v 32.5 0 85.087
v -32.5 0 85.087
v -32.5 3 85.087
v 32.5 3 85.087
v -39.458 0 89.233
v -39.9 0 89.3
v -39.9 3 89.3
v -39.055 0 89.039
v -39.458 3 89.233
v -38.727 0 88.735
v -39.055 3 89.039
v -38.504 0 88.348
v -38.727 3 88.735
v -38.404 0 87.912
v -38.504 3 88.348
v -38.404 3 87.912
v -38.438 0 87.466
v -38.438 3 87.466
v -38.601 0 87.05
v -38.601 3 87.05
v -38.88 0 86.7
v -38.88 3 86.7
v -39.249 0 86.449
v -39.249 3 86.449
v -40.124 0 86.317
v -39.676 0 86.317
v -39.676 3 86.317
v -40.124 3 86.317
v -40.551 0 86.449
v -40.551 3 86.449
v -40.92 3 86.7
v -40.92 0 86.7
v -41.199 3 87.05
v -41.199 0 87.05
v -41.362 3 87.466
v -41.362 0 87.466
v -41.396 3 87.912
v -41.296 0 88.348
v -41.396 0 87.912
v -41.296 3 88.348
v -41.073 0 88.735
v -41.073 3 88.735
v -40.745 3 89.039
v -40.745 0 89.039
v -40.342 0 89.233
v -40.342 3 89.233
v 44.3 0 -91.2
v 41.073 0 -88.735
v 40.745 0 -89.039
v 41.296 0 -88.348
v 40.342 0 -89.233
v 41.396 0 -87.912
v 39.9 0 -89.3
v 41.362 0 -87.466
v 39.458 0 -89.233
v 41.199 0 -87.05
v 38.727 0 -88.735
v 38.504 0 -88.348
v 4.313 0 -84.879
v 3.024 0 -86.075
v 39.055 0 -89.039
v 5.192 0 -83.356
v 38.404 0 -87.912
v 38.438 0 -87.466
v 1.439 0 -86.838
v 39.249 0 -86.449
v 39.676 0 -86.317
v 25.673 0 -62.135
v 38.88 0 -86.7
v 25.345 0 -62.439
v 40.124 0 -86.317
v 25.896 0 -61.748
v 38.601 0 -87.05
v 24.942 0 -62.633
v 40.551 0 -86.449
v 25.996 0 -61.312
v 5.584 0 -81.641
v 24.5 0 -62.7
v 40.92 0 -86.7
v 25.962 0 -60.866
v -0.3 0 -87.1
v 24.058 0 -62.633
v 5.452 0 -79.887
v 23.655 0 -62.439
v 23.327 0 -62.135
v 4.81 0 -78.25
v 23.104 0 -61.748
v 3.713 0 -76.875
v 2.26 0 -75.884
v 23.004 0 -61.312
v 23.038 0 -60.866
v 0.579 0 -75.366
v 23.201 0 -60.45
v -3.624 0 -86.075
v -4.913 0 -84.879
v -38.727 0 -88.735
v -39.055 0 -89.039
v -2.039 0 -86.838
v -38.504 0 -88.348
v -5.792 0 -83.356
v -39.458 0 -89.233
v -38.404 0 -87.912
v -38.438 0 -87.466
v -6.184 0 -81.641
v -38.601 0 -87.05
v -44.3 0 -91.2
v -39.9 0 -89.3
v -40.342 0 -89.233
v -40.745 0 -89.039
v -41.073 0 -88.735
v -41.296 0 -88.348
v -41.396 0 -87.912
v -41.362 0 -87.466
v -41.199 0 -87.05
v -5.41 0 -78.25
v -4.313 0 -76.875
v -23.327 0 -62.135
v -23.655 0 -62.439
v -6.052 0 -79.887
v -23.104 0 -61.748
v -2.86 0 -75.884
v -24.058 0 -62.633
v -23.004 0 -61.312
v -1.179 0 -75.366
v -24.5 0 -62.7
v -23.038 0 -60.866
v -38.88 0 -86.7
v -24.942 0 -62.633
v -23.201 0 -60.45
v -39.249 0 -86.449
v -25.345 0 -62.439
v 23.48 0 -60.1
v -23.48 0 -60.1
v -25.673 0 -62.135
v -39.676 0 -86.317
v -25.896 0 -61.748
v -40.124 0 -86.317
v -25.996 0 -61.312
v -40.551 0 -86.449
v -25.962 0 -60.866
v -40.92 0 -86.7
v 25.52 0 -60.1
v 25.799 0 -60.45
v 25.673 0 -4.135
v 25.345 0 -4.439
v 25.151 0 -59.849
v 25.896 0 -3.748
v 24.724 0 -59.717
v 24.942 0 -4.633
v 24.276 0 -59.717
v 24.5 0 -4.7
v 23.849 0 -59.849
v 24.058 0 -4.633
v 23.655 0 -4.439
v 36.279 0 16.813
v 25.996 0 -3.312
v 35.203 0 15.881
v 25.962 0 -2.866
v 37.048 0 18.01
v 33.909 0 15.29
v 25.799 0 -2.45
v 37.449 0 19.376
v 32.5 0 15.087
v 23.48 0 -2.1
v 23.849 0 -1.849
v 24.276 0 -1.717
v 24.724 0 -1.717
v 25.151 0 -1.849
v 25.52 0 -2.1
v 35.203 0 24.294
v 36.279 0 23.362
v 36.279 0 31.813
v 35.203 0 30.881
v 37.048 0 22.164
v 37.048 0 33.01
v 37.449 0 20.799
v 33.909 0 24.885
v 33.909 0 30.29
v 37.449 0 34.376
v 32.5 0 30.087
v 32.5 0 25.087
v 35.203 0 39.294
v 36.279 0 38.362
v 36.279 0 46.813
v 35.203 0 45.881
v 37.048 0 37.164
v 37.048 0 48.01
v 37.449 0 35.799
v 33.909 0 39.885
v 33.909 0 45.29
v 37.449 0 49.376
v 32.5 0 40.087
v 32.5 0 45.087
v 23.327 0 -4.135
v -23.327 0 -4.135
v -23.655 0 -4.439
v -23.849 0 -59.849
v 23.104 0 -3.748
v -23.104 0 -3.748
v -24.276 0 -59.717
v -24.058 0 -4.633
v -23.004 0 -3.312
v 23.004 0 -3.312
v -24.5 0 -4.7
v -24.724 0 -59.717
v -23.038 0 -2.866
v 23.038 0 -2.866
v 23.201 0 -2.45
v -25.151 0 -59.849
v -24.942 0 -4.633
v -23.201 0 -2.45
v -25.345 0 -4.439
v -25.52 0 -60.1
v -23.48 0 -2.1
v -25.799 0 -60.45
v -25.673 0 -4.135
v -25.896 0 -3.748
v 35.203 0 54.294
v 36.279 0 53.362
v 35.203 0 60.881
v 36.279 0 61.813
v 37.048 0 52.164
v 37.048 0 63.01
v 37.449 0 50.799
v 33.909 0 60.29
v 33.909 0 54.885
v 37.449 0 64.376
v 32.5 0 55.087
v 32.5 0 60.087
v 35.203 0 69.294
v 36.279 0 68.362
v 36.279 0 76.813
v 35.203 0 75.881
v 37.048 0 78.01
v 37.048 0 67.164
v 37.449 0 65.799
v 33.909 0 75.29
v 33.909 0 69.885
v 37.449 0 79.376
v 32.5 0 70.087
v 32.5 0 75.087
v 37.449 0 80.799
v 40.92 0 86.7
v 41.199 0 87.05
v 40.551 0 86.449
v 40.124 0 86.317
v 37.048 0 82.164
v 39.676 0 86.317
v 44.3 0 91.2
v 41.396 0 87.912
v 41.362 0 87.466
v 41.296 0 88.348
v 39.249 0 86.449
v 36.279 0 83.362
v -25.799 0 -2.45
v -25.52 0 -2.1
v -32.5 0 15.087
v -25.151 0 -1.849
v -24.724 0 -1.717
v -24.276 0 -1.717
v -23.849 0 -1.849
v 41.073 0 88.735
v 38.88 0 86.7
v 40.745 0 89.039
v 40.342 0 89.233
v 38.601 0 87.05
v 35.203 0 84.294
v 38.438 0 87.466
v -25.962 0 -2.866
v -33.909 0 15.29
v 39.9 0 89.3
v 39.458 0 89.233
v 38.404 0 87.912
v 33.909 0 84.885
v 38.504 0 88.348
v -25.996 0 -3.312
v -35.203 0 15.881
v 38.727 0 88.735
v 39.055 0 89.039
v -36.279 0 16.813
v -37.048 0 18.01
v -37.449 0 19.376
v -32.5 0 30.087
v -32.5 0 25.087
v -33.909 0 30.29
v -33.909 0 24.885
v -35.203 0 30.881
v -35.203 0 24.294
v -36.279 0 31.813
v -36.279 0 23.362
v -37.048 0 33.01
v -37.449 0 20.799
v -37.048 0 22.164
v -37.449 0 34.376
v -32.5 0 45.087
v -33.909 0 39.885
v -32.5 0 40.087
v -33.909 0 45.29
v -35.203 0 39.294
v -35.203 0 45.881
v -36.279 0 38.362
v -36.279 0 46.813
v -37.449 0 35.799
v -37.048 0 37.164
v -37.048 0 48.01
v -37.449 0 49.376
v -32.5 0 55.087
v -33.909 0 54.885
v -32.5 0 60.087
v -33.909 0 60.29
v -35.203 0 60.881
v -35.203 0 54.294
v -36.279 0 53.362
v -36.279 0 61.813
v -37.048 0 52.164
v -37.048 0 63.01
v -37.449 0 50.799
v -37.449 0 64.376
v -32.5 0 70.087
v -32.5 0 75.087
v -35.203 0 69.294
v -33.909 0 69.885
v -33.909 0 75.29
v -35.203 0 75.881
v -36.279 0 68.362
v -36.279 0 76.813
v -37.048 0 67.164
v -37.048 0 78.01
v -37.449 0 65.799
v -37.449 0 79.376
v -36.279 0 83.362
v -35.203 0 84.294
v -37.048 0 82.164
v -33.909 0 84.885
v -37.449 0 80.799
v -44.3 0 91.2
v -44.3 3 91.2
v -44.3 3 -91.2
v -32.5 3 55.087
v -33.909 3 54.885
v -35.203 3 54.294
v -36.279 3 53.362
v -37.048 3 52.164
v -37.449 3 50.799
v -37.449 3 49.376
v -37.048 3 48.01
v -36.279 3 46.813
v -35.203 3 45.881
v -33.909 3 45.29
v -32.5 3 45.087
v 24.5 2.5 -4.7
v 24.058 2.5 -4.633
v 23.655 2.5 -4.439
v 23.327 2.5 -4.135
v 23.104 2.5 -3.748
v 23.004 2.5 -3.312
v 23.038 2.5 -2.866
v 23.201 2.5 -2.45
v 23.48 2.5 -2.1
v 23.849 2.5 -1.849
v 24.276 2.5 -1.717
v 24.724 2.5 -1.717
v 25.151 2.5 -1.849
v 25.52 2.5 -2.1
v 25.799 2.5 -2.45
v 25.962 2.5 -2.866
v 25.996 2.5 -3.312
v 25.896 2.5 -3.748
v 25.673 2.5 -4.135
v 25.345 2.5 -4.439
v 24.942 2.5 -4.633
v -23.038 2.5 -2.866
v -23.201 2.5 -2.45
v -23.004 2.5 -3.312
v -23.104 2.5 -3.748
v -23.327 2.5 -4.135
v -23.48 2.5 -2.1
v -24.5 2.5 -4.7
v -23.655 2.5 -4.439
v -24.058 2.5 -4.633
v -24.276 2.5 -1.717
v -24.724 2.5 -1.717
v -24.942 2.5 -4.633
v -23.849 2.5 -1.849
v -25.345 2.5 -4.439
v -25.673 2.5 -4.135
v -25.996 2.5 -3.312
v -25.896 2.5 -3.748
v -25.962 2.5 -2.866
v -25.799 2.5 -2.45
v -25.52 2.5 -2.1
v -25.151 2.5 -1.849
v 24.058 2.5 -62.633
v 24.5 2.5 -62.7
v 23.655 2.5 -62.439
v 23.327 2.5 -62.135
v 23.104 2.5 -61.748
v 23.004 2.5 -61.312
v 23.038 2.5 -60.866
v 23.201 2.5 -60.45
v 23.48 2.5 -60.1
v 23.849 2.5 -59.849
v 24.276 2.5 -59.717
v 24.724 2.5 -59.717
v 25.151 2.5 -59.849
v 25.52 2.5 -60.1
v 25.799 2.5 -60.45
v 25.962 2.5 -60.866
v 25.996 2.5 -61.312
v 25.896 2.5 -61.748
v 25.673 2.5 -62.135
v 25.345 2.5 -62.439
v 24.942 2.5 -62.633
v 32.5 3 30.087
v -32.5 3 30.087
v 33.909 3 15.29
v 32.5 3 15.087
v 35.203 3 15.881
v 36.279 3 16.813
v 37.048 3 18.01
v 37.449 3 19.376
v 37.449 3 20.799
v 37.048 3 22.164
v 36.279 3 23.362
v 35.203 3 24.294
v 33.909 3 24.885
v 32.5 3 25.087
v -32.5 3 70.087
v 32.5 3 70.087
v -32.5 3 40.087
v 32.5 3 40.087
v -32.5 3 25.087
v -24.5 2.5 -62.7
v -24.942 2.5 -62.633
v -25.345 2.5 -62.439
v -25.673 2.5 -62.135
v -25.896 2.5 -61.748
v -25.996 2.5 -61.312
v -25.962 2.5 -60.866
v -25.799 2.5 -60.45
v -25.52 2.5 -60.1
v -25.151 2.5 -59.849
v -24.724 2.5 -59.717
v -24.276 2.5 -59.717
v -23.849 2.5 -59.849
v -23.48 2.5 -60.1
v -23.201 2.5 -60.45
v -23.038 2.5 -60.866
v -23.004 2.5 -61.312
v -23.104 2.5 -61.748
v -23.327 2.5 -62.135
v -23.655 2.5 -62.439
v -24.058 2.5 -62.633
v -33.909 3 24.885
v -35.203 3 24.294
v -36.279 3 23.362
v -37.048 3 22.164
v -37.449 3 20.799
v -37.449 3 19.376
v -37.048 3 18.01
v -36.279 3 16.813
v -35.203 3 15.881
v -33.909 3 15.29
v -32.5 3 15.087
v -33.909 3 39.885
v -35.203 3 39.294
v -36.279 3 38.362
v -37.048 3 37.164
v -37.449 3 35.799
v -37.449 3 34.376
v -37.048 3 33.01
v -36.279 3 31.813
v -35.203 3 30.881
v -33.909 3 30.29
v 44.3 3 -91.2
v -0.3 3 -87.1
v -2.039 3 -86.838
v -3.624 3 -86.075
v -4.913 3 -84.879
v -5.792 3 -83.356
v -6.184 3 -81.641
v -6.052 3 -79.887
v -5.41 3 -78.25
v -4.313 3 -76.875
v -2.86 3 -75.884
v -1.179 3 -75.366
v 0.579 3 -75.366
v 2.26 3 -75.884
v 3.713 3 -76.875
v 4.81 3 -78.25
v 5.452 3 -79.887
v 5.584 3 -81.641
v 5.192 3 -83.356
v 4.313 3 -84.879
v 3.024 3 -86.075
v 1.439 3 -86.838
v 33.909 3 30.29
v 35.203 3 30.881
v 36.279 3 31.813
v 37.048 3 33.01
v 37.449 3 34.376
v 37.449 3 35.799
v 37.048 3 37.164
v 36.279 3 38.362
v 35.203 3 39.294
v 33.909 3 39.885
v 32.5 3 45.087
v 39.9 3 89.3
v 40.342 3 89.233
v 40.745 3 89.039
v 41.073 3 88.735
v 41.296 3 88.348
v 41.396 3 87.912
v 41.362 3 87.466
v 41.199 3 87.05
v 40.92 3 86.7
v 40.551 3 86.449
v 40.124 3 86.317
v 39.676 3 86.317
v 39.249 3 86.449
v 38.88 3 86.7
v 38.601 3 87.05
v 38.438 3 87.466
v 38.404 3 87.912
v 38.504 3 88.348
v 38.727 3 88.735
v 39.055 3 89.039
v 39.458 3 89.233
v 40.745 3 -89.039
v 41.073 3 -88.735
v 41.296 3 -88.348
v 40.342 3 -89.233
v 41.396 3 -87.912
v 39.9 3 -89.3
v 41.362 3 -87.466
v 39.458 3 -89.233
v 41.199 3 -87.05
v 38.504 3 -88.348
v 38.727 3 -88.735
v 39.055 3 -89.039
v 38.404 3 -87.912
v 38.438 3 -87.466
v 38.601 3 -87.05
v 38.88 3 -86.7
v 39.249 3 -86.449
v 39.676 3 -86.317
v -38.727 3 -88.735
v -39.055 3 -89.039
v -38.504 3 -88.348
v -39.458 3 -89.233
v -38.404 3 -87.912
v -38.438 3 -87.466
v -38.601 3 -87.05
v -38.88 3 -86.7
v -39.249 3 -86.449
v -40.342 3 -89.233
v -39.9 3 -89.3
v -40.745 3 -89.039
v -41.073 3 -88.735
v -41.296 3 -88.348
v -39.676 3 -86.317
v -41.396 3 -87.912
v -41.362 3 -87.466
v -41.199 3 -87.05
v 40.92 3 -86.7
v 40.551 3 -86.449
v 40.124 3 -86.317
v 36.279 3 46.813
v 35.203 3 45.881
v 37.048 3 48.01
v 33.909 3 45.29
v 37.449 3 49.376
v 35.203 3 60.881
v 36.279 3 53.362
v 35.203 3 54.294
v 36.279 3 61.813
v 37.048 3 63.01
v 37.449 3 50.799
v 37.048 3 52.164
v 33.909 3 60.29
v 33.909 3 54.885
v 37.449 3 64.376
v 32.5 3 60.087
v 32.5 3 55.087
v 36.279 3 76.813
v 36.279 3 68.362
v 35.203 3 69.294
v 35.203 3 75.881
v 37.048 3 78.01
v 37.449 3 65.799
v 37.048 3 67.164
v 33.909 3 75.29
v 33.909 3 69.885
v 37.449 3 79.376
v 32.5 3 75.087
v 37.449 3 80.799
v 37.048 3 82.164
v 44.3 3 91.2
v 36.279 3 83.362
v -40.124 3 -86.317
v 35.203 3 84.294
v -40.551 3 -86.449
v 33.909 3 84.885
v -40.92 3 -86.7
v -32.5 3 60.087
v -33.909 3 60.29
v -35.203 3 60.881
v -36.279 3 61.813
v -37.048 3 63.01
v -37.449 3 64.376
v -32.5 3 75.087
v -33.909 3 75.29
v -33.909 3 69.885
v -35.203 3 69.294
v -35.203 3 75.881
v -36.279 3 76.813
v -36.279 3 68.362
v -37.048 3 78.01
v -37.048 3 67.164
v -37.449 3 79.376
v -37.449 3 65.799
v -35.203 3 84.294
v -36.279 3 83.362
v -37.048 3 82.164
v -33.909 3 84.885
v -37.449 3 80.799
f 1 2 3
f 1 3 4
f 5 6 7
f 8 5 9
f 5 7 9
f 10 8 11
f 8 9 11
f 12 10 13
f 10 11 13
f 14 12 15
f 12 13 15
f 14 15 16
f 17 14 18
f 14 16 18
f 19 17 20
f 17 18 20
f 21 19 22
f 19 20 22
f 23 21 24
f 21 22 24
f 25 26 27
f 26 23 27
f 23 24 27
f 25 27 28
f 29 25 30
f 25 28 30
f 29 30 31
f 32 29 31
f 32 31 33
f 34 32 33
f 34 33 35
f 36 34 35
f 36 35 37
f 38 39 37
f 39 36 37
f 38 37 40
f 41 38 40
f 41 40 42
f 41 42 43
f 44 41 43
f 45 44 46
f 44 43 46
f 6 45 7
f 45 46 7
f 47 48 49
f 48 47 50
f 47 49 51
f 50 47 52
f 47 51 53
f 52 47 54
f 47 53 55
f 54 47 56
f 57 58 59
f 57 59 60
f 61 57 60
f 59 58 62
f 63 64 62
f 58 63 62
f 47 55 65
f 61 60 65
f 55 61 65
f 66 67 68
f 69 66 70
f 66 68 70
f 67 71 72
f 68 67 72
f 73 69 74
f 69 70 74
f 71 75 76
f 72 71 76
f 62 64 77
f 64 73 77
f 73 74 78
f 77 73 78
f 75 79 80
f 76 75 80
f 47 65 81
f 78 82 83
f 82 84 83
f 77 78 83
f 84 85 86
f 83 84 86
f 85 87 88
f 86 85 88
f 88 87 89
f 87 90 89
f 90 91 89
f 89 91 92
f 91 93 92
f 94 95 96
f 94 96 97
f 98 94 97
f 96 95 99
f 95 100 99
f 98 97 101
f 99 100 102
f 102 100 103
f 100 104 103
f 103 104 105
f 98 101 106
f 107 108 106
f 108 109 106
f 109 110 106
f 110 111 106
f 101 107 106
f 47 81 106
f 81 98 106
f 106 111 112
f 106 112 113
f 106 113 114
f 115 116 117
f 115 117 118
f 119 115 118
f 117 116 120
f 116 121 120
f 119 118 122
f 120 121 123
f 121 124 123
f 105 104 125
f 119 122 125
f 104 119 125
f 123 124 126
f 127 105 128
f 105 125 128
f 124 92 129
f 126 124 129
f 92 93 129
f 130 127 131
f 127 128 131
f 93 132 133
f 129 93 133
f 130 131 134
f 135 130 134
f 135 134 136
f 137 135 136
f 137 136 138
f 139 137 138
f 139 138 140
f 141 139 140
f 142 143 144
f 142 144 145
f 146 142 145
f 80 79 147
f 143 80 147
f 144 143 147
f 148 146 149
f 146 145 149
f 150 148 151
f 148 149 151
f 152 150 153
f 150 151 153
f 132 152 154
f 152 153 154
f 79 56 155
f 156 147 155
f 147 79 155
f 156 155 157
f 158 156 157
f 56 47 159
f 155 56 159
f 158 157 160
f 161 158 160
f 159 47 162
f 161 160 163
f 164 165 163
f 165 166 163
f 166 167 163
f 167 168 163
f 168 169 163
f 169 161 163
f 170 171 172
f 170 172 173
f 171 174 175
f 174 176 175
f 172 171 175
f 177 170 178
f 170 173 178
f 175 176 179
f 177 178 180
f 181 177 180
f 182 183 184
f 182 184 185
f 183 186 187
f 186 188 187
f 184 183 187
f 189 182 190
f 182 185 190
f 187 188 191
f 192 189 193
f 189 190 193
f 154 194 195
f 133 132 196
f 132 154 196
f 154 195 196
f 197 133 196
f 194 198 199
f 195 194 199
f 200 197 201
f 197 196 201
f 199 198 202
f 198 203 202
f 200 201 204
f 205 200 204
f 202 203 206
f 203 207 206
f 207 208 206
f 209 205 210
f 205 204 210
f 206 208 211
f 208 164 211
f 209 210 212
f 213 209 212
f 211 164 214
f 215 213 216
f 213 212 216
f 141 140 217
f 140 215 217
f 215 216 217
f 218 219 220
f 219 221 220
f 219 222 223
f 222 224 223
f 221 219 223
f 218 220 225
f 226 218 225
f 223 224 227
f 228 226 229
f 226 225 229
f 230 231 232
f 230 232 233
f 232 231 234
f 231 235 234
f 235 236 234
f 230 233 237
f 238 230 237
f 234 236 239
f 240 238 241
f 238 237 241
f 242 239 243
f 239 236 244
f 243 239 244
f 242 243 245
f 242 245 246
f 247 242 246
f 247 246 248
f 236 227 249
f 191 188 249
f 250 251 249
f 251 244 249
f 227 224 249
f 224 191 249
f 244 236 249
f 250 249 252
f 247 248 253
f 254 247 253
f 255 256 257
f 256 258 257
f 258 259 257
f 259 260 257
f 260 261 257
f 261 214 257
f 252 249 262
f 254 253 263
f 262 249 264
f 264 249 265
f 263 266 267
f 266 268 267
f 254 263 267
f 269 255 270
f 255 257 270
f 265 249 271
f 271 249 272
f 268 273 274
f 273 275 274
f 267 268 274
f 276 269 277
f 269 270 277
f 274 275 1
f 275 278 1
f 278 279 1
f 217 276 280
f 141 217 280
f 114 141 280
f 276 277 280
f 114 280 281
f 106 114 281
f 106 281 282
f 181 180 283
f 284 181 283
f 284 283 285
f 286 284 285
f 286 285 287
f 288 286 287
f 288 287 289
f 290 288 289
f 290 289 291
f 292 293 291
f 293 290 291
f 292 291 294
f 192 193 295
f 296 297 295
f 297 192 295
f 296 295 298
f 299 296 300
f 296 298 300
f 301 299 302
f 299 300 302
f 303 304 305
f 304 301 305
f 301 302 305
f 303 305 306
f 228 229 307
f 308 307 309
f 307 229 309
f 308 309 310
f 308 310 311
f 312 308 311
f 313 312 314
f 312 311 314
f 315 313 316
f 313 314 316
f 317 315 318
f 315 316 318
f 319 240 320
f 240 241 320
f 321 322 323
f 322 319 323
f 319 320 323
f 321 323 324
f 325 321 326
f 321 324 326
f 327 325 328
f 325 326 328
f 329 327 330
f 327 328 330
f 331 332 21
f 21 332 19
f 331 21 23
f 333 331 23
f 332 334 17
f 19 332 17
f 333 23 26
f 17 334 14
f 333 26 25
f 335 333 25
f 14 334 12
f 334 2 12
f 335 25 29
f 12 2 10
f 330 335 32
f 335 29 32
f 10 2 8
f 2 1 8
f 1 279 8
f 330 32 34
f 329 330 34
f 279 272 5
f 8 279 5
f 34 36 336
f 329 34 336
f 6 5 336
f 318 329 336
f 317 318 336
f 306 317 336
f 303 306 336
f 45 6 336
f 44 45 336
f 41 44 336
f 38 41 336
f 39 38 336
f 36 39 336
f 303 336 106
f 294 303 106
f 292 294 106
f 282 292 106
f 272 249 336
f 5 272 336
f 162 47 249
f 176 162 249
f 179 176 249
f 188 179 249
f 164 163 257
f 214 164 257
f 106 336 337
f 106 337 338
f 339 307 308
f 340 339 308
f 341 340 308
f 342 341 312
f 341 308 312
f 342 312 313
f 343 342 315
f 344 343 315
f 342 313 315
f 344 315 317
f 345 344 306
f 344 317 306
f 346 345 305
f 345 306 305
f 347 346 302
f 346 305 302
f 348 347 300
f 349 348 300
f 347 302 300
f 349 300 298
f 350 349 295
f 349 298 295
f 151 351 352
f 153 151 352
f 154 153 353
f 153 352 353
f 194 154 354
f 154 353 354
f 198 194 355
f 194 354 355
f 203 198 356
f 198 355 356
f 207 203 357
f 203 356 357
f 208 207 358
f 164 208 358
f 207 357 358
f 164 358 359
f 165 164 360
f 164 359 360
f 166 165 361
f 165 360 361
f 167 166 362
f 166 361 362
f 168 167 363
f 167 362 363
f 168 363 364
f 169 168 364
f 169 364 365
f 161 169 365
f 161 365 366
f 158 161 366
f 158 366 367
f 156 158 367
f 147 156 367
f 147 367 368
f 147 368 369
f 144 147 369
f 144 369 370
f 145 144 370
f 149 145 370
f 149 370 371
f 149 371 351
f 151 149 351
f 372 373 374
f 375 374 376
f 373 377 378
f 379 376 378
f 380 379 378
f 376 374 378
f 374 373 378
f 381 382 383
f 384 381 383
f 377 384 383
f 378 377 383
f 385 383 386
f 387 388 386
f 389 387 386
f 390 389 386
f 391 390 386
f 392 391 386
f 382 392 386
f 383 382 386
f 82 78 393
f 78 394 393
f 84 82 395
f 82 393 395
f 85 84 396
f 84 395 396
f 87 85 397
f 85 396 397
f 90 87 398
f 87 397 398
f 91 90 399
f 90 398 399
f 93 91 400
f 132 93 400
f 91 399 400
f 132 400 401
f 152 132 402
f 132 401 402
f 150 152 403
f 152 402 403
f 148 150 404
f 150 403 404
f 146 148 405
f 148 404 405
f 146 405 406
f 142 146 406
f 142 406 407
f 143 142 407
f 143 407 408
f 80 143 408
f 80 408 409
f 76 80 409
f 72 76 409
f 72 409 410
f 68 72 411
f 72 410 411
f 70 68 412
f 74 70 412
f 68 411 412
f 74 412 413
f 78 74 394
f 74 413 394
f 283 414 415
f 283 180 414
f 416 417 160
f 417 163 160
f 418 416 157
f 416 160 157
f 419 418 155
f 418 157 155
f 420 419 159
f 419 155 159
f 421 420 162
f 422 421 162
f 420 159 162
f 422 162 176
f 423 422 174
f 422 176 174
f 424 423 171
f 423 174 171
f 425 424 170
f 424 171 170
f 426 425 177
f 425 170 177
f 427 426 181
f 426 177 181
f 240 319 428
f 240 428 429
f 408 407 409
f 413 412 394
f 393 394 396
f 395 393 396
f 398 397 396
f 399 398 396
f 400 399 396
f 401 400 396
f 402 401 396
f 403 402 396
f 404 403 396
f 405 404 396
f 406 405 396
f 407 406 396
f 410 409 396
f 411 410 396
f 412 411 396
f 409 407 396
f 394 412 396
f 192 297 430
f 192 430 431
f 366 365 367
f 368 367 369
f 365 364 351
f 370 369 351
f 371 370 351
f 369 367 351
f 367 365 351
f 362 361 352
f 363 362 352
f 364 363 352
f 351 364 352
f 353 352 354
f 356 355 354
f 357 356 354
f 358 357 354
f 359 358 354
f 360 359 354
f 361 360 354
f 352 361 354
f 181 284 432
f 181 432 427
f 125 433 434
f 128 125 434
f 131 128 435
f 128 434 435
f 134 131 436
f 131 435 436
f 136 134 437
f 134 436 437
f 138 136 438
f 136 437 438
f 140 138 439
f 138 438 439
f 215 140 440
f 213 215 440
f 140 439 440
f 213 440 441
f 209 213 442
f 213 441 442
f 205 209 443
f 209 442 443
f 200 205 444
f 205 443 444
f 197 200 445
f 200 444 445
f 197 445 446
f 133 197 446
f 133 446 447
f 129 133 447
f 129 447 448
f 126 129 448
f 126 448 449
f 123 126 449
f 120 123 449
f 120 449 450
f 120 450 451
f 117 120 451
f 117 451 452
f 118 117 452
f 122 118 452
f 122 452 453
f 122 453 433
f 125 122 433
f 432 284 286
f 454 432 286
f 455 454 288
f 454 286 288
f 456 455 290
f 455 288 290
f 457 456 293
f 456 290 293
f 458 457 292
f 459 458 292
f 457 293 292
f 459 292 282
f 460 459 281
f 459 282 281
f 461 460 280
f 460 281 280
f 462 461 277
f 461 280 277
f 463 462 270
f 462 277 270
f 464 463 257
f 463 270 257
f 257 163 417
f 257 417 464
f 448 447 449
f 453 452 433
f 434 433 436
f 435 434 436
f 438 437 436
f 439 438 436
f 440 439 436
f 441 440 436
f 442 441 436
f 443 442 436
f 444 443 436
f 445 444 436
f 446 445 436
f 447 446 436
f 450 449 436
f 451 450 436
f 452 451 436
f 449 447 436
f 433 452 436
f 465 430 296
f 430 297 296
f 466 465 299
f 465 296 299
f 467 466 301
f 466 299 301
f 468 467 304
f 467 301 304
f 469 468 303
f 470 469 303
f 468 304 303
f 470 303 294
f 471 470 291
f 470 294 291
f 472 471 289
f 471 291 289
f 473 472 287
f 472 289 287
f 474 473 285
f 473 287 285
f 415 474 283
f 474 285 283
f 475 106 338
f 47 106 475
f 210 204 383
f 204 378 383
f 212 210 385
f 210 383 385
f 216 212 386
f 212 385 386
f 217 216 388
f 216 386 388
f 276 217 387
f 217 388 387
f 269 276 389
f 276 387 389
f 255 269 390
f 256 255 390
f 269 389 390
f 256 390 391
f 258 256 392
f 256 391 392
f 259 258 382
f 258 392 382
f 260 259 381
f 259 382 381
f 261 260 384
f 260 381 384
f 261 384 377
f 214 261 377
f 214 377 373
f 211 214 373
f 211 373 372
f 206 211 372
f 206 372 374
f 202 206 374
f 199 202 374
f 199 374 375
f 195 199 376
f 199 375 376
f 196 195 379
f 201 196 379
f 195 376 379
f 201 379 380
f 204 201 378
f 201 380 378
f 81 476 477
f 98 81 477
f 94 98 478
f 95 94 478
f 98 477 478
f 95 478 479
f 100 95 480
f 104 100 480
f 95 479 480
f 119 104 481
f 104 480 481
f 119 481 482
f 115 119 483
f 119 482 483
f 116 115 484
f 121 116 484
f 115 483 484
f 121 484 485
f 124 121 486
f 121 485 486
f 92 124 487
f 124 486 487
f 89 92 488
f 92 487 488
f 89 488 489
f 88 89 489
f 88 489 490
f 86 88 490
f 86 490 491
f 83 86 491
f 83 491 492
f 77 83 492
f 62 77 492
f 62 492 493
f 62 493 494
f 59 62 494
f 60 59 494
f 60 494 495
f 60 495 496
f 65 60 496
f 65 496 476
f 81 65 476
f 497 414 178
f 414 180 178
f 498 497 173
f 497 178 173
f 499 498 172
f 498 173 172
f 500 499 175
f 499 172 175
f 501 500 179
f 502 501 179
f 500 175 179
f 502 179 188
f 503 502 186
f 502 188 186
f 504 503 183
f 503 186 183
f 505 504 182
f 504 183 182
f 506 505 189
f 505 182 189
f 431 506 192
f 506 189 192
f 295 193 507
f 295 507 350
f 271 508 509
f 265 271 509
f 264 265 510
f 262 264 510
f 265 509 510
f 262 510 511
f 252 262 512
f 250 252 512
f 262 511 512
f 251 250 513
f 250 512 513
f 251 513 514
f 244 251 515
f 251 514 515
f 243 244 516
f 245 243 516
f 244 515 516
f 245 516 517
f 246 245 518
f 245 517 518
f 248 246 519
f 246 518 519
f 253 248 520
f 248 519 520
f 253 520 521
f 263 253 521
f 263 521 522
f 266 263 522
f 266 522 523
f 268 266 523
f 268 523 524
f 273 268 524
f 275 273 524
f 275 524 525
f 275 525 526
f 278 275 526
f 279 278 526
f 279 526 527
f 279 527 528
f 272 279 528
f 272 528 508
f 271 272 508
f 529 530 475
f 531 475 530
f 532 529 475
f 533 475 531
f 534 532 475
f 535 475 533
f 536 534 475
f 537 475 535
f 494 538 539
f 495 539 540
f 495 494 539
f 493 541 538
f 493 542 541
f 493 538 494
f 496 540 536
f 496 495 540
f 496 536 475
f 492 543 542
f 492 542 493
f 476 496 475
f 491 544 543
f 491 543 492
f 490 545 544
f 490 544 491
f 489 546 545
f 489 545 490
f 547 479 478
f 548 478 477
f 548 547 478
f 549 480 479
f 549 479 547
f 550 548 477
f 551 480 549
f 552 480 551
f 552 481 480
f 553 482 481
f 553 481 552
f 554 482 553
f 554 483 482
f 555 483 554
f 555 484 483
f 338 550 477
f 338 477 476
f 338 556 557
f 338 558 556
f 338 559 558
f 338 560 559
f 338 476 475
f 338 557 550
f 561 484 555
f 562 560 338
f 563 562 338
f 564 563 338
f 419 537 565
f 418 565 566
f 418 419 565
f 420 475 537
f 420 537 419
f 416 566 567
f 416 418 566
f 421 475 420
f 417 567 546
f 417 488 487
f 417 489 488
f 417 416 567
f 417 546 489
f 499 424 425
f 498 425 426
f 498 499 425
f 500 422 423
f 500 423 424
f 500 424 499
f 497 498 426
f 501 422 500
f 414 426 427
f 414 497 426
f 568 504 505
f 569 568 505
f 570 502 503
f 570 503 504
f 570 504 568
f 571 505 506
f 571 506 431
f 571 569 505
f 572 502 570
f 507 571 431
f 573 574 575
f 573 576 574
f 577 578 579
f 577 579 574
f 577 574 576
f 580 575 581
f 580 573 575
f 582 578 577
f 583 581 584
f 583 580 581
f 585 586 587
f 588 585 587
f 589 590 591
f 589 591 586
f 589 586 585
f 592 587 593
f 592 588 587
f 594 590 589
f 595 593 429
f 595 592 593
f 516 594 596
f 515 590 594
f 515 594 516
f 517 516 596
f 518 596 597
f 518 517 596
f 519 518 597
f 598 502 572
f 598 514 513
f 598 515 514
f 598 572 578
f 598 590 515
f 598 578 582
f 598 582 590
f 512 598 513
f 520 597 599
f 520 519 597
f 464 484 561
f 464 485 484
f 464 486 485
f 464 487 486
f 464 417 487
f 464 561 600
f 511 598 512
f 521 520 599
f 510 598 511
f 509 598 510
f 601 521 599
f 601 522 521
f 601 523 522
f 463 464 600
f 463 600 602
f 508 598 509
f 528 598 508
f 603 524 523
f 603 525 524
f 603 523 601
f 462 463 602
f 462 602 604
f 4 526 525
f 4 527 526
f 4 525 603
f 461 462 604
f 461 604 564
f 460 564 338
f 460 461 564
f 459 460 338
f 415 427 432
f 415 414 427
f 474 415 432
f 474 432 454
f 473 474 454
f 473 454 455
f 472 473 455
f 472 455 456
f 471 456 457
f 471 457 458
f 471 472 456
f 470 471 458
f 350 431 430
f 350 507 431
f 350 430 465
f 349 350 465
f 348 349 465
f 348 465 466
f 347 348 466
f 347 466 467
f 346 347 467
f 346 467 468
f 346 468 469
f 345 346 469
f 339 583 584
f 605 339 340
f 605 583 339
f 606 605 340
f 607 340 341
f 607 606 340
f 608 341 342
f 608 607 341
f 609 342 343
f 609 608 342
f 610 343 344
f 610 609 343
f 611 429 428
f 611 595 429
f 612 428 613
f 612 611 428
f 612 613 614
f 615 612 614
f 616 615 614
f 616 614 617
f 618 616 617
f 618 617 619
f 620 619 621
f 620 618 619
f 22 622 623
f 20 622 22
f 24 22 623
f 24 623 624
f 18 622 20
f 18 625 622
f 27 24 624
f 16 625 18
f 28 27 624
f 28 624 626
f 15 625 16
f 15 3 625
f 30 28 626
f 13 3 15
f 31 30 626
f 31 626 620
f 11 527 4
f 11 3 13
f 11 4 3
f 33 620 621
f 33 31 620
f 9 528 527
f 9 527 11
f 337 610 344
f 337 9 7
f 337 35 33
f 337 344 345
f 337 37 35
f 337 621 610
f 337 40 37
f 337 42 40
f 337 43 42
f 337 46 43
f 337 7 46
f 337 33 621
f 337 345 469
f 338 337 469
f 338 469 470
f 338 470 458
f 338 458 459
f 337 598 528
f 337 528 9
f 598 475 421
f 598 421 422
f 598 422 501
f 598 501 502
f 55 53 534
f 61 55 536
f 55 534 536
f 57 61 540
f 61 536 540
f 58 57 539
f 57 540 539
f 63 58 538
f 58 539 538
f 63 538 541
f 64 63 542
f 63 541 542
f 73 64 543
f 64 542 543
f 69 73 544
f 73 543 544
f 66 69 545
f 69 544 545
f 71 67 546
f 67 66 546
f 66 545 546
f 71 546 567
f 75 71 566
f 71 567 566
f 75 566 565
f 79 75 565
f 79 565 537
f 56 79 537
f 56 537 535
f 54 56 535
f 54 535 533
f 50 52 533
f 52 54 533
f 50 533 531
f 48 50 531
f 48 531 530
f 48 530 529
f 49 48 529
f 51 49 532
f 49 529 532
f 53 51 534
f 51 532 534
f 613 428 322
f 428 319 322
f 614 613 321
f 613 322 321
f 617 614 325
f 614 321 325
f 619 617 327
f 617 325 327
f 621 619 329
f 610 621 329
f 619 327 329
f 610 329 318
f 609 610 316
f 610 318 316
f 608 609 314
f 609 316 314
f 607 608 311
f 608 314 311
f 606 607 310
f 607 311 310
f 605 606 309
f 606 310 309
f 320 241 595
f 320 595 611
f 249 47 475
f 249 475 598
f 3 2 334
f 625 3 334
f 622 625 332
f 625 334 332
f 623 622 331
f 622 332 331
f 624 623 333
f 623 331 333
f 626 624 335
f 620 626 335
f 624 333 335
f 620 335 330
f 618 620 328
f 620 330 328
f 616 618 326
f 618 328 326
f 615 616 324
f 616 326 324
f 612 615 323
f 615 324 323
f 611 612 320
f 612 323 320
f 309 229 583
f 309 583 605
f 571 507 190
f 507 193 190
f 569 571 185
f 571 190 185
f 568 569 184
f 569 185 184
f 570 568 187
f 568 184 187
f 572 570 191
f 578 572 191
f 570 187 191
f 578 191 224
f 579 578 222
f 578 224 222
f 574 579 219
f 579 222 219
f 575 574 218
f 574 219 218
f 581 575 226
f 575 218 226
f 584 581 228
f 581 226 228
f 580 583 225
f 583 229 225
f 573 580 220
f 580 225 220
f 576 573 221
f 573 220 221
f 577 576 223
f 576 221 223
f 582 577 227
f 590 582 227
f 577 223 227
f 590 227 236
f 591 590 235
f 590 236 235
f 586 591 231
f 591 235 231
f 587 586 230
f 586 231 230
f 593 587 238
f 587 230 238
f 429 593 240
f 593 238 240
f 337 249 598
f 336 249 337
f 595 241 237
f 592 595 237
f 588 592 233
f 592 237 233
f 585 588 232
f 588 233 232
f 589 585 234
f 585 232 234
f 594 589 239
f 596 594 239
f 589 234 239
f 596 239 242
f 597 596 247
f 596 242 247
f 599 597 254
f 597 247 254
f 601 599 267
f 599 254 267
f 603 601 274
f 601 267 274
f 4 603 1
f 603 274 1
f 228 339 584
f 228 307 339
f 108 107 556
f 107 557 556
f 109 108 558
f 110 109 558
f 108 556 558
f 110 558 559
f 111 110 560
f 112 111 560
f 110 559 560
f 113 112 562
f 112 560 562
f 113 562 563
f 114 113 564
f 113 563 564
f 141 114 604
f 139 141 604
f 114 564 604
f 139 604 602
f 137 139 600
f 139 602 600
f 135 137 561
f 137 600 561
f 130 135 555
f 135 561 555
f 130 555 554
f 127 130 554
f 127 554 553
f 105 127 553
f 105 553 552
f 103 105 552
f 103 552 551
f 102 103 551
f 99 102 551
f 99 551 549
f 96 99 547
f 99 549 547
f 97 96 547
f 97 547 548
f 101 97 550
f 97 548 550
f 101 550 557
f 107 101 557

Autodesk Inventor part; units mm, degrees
ref_plane "YZ Plane" through (0, 0, 0) normal (1, 0, 0) x (0, 1, 0)
ref_plane "XZ Plane" through (0, 0, 0) normal (0, 1, 0) x (-1, 0, 0)
ref_plane "XY Plane" through (0, 0, 0) normal (0, 0, 1) x (1, 0, 0)
sketch "Skizze1" plane through (0, 0, 0) normal (0, 1, 0) x (-1, 0, 0)
  line L0 (-44.3, 91.2) -> (44.3, 91.2)
  line L1 (44.3, 91.2) -> (44.3, -91.2)
  line L2 (44.3, -91.2) -> (-44.3, -91.2)
  line L3 (-44.3, -91.2) -> (-44.3, 91.2)
  line L4 (-44.3, 91.2) -> (44.3, -91.2) construction
  line L5 (44.3, 91.2) -> (-44.3, -91.2) construction
  point P0 (0, 0)
  dimension "d0" = 88.6
  dimension "d1" = 182.4
extrude "Extrusion1" add sketch "Skizze1" along normal blind 3
sketch "Skizze2" plane through (0, 0, 0) normal (0, -1, 0) x (1, 0, 0)
  line L0 (-44.3, -91.2) -> (44.3, -91.2) projected
  line L1 (0, -91.2) -> (0, 91.2)
  line L2 (44.3, 91.2) -> (-44.3, 91.2) projected
  line L3 (-24.5, -61.2) -> (24.5, -61.2)
  line L4 (24.5, -61.2) -> (24.5, -3.2)
  line L5 (24.5, -3.2) -> (-24.5, -3.2)
  line L6 (-24.5, -3.2) -> (-24.5, -61.2)
  line L7 (-24.5, -61.2) -> (24.5, -3.2) construction
  line L8 (24.5, -61.2) -> (-24.5, -3.2) construction
  point P0 (0, 0)
  point P1 (0, -32.2)
  dimension "d5" = 49
  dimension "d6" = 58
  dimension "d7" = 30
hole "Bohrung1" at (-24.5, 0, -61.2) at (24.5, 0, -61.2) at (24.5, 0, -3.2) at (-24.5, 0, -3.2) direction (0, 1, 0) diameter 3 depth 2.5
sketch "Skizze3" plane through (0, 0, 0) normal (0, -1, 0) x (1, 0, 0)
  line L0 (32.5, 15.0873) -> (-32.5, 15.0873)
  line L1 (-37.5, 20.0873) -> (-37.5, 20.0873)
  line L2 (-32.5, 25.0873) -> (32.5, 25.0873)
  line L3 (37.5, 20.0873) -> (37.5, 20.0873)
  line L4 (37.5, 15.0873) -> (-37.5, 25.0873) construction
  line L5 (-37.5, 15.0873) -> (37.5, 25.0873) construction
  arc A0 (-37.5, 20.0873) -> (-32.5, 15.0873) centre (-32.5, 20.0873) ccw
  arc A1 (-32.5, 25.0873) -> (-37.5, 20.0873) centre (-32.5, 20.0873) ccw
  arc A2 (32.5, 15.0873) -> (37.5, 20.0873) centre (32.5, 20.0873) ccw
  arc A3 (37.5, 20.0873) -> (32.5, 25.0873) centre (32.5, 20.0873) ccw
  point P0 (0, 0)
  point P1 (0, 20.0873)
  dimension "d15" = 75
  dimension "d16" = 10
  dimension "d18" = 5
  dimension "d19" = 5
  dimension "d20" = 5
extrude "Extrusion2" cut sketch "Skizze3" against normal blind 10
pattern_linear "Rechteckige Anordnung1" count 5 spacing 15 along (0, 0, 1) of "Extrusion2"
hole "Bohrung2" at (-39.9, 0, -87.8) direction (0, 1, 0) diameter 3 depth 8 tip angle 118
mirror "Spiegeln1" about plane through (0, 0, 0) normal (1, 0, 0) of "Bohrung2"
mirror "Spiegeln2" about plane through (0, 0, 0) normal (0, 0, 1) of "Bohrung2", "Spiegeln1"
hole "Bohrung3" at (-0.3, 0, -81.2) direction (0, 1, 0) diameter 11.8 depth 8 tip angle 118
properties part number "RaspberryBox_Backplate_v2"
